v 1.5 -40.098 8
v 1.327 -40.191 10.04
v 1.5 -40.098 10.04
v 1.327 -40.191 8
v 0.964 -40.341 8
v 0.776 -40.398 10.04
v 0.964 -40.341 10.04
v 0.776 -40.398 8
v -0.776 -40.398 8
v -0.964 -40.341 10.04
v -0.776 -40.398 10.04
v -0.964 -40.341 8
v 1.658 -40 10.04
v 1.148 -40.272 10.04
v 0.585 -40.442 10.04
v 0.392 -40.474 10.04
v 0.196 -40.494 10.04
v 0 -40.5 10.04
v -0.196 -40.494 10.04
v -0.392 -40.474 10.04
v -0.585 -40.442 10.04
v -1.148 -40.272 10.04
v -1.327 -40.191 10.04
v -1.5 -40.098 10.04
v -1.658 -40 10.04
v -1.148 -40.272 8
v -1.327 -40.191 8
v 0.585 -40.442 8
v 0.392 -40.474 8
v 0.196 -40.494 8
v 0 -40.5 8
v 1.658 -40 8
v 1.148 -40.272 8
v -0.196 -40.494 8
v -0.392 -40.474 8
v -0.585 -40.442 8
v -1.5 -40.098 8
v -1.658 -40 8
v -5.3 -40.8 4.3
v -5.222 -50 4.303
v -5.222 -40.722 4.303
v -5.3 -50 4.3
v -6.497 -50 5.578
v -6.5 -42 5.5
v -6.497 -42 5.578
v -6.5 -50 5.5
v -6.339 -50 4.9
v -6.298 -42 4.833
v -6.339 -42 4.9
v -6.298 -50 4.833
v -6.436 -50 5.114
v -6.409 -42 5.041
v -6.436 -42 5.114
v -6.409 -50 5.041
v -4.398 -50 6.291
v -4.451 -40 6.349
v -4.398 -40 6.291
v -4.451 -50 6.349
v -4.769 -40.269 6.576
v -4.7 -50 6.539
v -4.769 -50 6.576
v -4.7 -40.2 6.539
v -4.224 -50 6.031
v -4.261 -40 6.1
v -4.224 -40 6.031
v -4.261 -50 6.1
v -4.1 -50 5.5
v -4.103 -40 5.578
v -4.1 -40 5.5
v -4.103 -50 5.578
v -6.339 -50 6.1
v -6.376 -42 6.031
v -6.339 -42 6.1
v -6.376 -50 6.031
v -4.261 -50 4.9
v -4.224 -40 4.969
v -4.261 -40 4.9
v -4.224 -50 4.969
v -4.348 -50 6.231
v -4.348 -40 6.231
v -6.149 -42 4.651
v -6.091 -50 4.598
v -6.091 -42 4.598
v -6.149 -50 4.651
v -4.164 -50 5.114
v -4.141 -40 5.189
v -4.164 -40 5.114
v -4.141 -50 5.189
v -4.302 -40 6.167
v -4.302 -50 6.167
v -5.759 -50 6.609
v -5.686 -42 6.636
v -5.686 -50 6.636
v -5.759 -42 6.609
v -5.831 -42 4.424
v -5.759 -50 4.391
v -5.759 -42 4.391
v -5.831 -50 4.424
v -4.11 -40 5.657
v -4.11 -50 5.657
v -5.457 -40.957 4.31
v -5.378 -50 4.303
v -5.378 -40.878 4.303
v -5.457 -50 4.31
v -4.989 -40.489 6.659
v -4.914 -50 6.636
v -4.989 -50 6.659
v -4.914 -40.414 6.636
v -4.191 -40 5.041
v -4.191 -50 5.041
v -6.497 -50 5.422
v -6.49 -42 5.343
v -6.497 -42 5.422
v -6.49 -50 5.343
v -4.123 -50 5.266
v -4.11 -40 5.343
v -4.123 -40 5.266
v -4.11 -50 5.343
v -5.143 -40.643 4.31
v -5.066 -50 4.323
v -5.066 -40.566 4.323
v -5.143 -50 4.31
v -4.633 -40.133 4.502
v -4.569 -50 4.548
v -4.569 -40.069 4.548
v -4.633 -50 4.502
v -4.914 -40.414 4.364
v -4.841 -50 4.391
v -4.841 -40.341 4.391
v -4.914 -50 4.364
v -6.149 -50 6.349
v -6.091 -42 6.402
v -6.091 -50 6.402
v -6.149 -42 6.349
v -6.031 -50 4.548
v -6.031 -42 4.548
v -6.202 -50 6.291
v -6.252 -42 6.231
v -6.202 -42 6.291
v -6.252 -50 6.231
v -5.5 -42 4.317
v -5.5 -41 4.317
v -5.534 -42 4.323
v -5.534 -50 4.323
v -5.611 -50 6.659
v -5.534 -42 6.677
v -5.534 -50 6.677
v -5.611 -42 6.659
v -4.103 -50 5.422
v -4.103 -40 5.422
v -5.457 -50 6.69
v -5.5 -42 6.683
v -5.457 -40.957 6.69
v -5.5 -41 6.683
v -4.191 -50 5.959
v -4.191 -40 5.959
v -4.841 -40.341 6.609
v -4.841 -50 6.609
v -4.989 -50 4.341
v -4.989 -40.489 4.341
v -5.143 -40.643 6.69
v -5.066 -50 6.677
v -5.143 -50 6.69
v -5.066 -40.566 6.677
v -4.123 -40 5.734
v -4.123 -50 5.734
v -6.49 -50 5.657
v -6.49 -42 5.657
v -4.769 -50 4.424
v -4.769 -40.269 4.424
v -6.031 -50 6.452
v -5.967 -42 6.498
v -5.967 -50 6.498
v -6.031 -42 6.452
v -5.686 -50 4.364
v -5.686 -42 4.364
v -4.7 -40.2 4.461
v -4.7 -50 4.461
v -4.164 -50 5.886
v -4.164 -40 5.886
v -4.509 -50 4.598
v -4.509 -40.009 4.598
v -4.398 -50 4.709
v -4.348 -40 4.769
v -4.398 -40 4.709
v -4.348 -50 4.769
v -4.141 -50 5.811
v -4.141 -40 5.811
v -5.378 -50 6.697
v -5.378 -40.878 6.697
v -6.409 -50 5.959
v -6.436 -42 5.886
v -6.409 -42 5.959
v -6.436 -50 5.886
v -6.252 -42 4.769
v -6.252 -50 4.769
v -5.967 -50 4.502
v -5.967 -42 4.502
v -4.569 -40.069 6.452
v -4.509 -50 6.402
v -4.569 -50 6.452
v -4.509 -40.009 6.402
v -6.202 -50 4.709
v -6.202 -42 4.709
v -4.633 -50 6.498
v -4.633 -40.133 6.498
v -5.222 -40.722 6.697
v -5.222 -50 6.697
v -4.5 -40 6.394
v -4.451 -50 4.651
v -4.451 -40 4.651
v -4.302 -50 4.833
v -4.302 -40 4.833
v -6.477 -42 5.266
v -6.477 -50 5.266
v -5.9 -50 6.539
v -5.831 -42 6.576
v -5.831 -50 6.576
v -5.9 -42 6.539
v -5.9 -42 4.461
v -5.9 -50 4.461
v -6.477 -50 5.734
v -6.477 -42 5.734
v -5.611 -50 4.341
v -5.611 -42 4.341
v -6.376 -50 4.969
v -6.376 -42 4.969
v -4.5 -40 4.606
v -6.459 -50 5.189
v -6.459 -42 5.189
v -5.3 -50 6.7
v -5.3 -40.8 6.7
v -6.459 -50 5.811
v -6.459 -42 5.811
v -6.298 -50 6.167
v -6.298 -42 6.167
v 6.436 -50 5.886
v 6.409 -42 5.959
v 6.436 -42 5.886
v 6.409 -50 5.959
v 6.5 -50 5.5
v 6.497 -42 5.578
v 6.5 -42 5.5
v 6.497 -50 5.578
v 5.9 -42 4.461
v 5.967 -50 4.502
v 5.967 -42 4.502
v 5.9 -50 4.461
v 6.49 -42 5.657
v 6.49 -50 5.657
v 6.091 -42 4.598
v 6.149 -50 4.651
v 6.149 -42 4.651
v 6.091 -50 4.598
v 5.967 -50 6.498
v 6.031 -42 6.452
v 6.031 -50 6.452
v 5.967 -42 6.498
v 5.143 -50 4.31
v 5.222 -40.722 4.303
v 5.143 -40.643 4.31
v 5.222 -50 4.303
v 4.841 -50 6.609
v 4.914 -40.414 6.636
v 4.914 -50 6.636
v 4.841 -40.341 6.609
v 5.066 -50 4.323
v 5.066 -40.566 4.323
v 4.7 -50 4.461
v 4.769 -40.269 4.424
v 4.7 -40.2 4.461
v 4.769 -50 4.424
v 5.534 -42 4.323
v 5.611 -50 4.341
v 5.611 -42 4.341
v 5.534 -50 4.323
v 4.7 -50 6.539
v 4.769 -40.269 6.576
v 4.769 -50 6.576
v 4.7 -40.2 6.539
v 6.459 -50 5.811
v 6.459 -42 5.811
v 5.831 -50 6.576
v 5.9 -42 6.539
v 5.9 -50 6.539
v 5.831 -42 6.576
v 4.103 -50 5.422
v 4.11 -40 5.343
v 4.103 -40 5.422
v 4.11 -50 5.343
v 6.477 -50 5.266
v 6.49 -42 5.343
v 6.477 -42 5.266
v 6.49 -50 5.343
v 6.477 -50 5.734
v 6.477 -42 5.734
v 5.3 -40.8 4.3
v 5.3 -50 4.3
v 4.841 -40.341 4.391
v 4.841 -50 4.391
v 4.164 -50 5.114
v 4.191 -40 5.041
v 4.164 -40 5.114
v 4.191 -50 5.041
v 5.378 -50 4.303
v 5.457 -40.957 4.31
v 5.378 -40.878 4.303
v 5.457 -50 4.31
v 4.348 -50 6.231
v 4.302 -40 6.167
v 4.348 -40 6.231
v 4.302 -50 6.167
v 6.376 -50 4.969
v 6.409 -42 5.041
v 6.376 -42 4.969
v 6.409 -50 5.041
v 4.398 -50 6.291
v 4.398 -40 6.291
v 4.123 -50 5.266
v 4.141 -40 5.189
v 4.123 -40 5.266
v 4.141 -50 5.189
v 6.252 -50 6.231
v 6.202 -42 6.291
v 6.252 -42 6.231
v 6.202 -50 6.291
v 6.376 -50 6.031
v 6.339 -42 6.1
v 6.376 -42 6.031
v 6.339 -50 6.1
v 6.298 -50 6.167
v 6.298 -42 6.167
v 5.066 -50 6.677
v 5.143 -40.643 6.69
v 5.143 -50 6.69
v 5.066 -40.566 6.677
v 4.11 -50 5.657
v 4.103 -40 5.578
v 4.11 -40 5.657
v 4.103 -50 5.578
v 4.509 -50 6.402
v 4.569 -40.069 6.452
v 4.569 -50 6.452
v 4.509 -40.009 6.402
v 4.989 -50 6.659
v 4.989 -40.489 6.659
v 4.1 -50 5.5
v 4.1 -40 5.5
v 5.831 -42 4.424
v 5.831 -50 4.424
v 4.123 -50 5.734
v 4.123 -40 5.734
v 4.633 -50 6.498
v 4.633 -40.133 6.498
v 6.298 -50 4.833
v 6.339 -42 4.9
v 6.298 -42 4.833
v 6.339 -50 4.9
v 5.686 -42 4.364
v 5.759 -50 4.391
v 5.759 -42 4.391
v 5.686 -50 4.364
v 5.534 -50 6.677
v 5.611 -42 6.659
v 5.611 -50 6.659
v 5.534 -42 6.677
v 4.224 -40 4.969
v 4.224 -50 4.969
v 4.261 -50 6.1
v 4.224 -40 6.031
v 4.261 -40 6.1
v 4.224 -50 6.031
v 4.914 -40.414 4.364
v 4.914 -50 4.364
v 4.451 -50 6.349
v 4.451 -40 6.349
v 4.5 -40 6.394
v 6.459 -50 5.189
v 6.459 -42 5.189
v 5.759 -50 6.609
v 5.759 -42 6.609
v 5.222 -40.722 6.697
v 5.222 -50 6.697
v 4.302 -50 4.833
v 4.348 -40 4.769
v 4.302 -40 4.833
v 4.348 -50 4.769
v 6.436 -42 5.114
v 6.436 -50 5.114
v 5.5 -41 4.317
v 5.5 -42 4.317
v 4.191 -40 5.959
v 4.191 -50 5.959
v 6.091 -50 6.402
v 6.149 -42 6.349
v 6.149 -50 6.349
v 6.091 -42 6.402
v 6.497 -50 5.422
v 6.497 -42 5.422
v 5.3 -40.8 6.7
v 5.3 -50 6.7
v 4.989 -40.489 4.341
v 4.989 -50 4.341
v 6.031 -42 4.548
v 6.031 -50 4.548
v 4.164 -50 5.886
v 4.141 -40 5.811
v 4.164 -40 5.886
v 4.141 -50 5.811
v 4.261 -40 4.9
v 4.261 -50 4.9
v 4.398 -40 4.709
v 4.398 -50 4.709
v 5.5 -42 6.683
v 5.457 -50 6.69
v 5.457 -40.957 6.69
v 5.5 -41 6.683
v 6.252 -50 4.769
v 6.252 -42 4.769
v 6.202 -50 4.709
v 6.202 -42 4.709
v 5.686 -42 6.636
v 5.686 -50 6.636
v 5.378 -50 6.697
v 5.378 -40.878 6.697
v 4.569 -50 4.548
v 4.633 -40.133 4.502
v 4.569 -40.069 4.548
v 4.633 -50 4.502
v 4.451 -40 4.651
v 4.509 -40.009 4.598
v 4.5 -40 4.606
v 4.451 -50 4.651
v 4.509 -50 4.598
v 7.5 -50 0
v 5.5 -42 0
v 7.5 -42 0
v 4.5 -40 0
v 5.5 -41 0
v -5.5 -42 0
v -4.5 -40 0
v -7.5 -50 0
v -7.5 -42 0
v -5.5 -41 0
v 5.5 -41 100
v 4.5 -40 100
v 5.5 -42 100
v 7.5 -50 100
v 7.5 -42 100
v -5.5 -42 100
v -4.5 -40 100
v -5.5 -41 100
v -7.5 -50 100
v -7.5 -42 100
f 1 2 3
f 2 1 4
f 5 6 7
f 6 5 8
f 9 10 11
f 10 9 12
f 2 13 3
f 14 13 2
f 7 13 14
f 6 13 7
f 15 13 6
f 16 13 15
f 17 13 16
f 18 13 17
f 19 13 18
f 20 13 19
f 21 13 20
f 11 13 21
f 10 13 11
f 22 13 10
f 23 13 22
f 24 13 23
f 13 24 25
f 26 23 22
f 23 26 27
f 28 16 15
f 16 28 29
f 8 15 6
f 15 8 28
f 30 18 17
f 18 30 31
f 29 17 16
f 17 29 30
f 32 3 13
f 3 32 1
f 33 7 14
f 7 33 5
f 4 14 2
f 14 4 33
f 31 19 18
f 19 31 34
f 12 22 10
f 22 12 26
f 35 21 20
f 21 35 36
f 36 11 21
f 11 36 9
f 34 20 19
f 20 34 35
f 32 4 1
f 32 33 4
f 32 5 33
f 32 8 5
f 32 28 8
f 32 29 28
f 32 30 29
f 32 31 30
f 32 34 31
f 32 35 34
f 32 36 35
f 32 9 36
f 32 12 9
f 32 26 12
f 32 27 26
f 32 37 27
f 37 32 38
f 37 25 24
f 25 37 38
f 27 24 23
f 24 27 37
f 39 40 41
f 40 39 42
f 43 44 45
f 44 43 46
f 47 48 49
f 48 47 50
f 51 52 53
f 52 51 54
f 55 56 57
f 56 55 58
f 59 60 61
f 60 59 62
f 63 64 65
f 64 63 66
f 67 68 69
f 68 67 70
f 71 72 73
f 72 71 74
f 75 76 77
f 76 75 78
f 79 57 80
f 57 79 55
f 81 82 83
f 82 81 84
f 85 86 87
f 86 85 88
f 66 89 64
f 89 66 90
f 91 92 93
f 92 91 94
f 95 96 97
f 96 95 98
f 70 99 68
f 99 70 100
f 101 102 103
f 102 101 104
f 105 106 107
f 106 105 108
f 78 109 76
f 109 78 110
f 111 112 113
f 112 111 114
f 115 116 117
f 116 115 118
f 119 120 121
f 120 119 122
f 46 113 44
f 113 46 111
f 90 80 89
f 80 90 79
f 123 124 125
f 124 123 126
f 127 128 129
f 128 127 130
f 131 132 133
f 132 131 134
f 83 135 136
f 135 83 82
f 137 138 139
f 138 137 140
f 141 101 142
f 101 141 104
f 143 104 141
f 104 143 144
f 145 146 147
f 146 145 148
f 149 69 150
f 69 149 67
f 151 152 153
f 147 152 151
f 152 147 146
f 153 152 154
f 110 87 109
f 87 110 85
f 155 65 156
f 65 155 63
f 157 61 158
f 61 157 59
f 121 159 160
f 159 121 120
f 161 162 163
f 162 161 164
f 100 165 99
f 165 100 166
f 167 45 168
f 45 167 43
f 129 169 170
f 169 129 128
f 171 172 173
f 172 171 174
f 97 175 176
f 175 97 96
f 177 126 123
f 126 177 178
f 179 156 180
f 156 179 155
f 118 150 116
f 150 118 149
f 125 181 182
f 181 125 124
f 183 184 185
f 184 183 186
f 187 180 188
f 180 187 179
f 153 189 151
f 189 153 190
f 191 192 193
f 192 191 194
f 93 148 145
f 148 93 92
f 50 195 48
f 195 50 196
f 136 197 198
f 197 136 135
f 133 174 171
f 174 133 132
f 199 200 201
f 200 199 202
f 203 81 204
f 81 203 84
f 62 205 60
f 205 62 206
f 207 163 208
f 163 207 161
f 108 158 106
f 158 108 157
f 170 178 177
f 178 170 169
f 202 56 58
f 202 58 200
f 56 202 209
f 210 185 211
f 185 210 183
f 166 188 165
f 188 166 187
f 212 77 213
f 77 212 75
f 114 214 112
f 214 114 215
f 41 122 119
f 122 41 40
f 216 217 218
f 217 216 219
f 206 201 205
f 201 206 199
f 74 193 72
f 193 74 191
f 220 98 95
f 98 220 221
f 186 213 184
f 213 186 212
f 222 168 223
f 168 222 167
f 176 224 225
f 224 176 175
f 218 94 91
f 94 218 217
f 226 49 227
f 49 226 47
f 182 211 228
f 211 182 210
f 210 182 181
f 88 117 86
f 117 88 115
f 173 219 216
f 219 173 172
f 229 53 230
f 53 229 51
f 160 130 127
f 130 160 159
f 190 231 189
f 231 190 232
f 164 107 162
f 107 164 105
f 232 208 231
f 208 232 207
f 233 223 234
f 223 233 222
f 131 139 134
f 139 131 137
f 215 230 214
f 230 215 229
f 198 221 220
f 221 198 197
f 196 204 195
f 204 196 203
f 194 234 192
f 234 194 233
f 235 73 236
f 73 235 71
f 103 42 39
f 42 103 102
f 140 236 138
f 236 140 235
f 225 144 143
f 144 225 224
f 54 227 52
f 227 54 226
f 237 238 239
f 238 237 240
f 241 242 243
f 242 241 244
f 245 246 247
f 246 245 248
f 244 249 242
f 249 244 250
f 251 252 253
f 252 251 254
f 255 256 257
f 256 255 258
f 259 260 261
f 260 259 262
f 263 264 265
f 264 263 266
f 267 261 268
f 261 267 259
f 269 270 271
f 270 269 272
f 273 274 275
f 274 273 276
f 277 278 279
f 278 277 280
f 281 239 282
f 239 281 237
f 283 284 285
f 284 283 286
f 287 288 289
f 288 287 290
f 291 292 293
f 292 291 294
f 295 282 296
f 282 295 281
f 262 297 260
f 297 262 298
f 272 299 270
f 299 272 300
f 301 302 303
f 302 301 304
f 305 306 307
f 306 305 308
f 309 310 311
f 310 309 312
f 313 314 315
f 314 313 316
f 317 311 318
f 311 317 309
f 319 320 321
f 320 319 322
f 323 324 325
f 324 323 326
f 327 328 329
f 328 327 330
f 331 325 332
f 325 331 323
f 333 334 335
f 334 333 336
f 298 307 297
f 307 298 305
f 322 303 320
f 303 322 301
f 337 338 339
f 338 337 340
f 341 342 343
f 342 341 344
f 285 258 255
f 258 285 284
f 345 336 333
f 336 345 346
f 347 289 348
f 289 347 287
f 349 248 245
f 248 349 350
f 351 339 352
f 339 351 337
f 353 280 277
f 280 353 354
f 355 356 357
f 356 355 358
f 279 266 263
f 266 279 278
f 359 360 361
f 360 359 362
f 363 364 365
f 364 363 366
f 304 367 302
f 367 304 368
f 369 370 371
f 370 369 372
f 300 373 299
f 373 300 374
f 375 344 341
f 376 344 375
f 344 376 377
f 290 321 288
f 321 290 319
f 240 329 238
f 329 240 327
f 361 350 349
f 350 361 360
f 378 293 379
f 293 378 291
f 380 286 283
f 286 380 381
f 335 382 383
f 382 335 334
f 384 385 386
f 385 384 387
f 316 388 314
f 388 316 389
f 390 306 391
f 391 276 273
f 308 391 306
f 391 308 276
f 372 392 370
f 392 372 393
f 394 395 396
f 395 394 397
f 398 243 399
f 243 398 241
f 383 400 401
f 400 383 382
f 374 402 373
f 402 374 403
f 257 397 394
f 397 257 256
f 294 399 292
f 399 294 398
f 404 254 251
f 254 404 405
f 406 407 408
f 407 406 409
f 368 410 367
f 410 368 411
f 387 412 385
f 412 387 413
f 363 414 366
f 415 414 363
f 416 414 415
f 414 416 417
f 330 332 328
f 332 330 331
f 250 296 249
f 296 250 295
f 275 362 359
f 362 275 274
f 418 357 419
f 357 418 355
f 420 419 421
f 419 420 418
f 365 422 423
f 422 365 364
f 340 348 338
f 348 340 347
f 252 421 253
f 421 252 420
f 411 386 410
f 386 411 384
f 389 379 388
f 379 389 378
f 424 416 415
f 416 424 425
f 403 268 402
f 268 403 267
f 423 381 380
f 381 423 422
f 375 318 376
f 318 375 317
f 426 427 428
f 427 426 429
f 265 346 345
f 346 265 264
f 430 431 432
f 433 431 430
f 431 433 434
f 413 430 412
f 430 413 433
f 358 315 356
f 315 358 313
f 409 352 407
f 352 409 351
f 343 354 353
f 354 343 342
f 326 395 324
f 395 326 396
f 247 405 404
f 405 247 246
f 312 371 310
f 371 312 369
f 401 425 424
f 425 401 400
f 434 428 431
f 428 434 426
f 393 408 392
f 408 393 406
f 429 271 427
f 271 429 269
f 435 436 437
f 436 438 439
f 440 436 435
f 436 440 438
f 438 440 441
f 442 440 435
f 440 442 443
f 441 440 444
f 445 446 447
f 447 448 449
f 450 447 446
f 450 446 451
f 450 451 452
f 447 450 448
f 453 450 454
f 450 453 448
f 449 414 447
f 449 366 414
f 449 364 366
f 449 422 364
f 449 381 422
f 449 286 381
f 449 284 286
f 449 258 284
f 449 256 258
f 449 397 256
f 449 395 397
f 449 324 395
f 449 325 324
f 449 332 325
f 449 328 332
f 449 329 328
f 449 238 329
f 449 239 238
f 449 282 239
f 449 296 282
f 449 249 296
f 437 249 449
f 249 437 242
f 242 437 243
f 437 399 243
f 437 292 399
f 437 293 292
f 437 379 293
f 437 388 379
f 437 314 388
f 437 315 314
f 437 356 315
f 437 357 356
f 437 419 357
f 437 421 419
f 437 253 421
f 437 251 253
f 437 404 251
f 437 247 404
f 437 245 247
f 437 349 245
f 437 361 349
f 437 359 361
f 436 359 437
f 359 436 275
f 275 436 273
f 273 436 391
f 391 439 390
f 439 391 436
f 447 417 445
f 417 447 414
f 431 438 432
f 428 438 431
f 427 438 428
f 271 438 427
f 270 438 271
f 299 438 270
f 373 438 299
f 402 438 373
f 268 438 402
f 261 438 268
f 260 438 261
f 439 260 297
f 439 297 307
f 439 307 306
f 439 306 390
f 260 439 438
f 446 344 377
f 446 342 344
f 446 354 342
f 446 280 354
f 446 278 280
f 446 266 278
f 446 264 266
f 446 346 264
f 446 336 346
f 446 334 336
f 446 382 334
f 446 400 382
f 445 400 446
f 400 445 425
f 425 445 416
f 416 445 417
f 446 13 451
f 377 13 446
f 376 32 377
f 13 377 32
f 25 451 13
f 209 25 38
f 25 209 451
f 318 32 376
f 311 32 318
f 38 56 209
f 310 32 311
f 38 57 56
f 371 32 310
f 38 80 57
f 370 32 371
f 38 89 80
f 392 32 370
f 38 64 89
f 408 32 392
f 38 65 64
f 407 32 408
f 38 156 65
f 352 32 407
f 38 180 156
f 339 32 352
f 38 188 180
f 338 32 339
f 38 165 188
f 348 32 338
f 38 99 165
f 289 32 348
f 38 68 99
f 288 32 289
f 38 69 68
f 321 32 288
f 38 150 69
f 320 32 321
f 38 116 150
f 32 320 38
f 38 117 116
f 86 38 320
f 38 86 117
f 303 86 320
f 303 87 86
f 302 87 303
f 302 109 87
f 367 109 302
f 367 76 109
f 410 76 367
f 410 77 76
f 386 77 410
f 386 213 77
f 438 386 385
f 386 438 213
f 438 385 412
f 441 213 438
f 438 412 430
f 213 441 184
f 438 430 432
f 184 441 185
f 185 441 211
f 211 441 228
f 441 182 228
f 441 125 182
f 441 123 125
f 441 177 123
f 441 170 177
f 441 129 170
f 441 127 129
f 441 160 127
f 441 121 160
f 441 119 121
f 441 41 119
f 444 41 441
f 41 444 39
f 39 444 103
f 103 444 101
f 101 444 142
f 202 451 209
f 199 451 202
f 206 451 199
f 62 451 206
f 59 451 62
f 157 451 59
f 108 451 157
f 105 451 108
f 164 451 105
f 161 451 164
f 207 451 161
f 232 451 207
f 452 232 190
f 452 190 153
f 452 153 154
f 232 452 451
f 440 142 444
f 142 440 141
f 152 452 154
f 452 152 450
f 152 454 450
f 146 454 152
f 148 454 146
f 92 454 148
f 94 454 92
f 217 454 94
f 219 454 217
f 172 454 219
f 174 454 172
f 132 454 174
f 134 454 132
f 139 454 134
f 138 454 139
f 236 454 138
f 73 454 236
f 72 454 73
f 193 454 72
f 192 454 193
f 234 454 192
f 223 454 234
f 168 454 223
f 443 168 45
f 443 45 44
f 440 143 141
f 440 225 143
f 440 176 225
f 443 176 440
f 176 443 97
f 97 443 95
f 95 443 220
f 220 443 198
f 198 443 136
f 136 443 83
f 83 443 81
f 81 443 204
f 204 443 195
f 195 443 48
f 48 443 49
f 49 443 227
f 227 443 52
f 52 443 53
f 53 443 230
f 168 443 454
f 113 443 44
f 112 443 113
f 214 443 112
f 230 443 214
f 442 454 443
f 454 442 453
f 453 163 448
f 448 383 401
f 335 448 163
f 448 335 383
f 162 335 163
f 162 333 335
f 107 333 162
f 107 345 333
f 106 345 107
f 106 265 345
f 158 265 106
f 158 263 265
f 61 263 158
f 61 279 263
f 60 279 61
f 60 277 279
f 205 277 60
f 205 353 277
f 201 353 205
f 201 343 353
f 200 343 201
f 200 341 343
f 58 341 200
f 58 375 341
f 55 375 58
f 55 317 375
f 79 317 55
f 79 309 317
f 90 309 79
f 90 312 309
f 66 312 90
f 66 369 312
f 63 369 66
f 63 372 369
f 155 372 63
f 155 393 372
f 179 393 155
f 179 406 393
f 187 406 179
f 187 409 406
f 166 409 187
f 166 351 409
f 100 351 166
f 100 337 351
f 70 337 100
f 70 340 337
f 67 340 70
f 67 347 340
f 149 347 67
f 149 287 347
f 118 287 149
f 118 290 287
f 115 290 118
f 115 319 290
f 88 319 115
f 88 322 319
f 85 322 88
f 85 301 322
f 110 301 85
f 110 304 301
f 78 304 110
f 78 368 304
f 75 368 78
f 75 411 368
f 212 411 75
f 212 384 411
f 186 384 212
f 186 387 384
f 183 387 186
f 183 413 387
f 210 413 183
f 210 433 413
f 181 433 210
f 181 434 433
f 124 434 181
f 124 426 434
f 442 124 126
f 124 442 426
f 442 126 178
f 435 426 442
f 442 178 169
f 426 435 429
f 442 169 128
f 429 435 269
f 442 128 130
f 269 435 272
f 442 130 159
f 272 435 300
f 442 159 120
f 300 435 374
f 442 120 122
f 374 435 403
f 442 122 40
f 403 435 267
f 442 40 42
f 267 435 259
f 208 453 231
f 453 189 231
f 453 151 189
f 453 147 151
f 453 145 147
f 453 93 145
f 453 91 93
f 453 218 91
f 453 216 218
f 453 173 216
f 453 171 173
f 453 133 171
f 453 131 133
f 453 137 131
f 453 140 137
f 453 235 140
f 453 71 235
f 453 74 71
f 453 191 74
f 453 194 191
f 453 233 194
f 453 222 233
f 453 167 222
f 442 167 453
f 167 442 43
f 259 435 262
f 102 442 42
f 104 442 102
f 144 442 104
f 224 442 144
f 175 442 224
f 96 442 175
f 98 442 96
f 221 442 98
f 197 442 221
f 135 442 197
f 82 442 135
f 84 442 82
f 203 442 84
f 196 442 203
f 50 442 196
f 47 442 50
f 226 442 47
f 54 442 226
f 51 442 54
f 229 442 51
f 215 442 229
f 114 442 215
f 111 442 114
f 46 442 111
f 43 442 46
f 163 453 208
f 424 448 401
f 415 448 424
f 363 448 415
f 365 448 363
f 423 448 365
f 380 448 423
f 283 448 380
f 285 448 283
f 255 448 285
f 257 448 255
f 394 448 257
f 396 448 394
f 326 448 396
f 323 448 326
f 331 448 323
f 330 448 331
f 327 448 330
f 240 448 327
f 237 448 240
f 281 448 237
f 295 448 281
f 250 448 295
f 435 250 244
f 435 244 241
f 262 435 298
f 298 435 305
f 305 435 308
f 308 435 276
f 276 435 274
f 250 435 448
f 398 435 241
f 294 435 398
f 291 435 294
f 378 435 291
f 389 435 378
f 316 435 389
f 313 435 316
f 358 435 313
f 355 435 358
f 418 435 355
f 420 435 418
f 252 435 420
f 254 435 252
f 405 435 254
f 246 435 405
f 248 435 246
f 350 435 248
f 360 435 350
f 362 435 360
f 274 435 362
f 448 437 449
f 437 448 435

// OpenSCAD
$fn = 96;

// Miniature linear guide rail (overall envelope)
rail_w = 15.0;   // X
rail_h = 10.0;   // Z
rail_l = 100.0;  // Y

// Profile details (kept within overall envelope)
side_step_h = 2.0;
side_step_inset = 2.0;
top_chamfer = 1.0;

// Raceway grooves (visual detail)
race_r = 1.2;                 // groove radius
race_z = rail_h * 0.55;       // groove center height from bottom
race_x = rail_w/2 - 2.2;      // groove center inset from side

// Mounting holes (typical small rail)
hole_d = 3.2;
hole_csk_d = 6.0;
hole_csk_h = 2.0;
hole_pitch = 25.0;
hole_edge_margin = 12.5;      // from each end along Y

// Small overlap to ensure robust booleans
eps = 0.02;

module rail_profile_2d() {
    // X-Z polygon, centered on X=0, bottom at Z=0
    polygon(points=[
        [-rail_w/2, 0],
        [ rail_w/2, 0],
        [ rail_w/2, rail_h - side_step_h],
        [ rail_w/2 - side_step_inset, rail_h - side_step_h],
        [ rail_w/2 - side_step_inset, rail_h - top_chamfer],
        [ rail_w/2 - side_step_inset - top_chamfer, rail_h],
        [-(rail_w/2 - side_step_inset - top_chamfer), rail_h],
        [-(rail_w/2 - side_step_inset), rail_h - top_chamfer],
        [-(rail_w/2 - side_step_inset), rail_h - side_step_h],
        [-rail_w/2, rail_h - side_step_h]
    ]);
}

module rail_body() {
    // Extrude along Y directly (no rotation), centered in Y for predictable views
    translate([0, -rail_l/2, 0])
        linear_extrude(height=rail_l, center=false, convexity=10)
            rail_profile_2d();
}

module mounting_holes_and_counterbores() {
    // Holes run along Z (vertical), placed along Y, centered in X
    for (y = [-rail_l/2 + hole_edge_margin : hole_pitch : rail_l/2 - hole_edge_margin]) {
        // Through hole
        translate([0, y, rail_h/2])
            cylinder(d=hole_d, h=rail_h + 2*eps, center=true);

        // Counterbore from top (recess)
        translate([0, y, rail_h - hole_csk_h/2 + eps])
            cylinder(d=hole_csk_d, h=hole_csk_h + 2*eps, center=true);
    }
}

module raceway_grooves() {
    // Two longitudinal grooves along Y, cut into the sides (visual raceways)
    for (sx = [-1, 1]) {
        translate([sx * race_x, 0, race_z])
            rotate([90, 0, 0])
                cylinder(r=race_r, h=rail_l + 2*eps, center=true);
    }
}

difference() {
    rail_body();
    mounting_holes_and_counterbores();
    raceway_grooves();
}
